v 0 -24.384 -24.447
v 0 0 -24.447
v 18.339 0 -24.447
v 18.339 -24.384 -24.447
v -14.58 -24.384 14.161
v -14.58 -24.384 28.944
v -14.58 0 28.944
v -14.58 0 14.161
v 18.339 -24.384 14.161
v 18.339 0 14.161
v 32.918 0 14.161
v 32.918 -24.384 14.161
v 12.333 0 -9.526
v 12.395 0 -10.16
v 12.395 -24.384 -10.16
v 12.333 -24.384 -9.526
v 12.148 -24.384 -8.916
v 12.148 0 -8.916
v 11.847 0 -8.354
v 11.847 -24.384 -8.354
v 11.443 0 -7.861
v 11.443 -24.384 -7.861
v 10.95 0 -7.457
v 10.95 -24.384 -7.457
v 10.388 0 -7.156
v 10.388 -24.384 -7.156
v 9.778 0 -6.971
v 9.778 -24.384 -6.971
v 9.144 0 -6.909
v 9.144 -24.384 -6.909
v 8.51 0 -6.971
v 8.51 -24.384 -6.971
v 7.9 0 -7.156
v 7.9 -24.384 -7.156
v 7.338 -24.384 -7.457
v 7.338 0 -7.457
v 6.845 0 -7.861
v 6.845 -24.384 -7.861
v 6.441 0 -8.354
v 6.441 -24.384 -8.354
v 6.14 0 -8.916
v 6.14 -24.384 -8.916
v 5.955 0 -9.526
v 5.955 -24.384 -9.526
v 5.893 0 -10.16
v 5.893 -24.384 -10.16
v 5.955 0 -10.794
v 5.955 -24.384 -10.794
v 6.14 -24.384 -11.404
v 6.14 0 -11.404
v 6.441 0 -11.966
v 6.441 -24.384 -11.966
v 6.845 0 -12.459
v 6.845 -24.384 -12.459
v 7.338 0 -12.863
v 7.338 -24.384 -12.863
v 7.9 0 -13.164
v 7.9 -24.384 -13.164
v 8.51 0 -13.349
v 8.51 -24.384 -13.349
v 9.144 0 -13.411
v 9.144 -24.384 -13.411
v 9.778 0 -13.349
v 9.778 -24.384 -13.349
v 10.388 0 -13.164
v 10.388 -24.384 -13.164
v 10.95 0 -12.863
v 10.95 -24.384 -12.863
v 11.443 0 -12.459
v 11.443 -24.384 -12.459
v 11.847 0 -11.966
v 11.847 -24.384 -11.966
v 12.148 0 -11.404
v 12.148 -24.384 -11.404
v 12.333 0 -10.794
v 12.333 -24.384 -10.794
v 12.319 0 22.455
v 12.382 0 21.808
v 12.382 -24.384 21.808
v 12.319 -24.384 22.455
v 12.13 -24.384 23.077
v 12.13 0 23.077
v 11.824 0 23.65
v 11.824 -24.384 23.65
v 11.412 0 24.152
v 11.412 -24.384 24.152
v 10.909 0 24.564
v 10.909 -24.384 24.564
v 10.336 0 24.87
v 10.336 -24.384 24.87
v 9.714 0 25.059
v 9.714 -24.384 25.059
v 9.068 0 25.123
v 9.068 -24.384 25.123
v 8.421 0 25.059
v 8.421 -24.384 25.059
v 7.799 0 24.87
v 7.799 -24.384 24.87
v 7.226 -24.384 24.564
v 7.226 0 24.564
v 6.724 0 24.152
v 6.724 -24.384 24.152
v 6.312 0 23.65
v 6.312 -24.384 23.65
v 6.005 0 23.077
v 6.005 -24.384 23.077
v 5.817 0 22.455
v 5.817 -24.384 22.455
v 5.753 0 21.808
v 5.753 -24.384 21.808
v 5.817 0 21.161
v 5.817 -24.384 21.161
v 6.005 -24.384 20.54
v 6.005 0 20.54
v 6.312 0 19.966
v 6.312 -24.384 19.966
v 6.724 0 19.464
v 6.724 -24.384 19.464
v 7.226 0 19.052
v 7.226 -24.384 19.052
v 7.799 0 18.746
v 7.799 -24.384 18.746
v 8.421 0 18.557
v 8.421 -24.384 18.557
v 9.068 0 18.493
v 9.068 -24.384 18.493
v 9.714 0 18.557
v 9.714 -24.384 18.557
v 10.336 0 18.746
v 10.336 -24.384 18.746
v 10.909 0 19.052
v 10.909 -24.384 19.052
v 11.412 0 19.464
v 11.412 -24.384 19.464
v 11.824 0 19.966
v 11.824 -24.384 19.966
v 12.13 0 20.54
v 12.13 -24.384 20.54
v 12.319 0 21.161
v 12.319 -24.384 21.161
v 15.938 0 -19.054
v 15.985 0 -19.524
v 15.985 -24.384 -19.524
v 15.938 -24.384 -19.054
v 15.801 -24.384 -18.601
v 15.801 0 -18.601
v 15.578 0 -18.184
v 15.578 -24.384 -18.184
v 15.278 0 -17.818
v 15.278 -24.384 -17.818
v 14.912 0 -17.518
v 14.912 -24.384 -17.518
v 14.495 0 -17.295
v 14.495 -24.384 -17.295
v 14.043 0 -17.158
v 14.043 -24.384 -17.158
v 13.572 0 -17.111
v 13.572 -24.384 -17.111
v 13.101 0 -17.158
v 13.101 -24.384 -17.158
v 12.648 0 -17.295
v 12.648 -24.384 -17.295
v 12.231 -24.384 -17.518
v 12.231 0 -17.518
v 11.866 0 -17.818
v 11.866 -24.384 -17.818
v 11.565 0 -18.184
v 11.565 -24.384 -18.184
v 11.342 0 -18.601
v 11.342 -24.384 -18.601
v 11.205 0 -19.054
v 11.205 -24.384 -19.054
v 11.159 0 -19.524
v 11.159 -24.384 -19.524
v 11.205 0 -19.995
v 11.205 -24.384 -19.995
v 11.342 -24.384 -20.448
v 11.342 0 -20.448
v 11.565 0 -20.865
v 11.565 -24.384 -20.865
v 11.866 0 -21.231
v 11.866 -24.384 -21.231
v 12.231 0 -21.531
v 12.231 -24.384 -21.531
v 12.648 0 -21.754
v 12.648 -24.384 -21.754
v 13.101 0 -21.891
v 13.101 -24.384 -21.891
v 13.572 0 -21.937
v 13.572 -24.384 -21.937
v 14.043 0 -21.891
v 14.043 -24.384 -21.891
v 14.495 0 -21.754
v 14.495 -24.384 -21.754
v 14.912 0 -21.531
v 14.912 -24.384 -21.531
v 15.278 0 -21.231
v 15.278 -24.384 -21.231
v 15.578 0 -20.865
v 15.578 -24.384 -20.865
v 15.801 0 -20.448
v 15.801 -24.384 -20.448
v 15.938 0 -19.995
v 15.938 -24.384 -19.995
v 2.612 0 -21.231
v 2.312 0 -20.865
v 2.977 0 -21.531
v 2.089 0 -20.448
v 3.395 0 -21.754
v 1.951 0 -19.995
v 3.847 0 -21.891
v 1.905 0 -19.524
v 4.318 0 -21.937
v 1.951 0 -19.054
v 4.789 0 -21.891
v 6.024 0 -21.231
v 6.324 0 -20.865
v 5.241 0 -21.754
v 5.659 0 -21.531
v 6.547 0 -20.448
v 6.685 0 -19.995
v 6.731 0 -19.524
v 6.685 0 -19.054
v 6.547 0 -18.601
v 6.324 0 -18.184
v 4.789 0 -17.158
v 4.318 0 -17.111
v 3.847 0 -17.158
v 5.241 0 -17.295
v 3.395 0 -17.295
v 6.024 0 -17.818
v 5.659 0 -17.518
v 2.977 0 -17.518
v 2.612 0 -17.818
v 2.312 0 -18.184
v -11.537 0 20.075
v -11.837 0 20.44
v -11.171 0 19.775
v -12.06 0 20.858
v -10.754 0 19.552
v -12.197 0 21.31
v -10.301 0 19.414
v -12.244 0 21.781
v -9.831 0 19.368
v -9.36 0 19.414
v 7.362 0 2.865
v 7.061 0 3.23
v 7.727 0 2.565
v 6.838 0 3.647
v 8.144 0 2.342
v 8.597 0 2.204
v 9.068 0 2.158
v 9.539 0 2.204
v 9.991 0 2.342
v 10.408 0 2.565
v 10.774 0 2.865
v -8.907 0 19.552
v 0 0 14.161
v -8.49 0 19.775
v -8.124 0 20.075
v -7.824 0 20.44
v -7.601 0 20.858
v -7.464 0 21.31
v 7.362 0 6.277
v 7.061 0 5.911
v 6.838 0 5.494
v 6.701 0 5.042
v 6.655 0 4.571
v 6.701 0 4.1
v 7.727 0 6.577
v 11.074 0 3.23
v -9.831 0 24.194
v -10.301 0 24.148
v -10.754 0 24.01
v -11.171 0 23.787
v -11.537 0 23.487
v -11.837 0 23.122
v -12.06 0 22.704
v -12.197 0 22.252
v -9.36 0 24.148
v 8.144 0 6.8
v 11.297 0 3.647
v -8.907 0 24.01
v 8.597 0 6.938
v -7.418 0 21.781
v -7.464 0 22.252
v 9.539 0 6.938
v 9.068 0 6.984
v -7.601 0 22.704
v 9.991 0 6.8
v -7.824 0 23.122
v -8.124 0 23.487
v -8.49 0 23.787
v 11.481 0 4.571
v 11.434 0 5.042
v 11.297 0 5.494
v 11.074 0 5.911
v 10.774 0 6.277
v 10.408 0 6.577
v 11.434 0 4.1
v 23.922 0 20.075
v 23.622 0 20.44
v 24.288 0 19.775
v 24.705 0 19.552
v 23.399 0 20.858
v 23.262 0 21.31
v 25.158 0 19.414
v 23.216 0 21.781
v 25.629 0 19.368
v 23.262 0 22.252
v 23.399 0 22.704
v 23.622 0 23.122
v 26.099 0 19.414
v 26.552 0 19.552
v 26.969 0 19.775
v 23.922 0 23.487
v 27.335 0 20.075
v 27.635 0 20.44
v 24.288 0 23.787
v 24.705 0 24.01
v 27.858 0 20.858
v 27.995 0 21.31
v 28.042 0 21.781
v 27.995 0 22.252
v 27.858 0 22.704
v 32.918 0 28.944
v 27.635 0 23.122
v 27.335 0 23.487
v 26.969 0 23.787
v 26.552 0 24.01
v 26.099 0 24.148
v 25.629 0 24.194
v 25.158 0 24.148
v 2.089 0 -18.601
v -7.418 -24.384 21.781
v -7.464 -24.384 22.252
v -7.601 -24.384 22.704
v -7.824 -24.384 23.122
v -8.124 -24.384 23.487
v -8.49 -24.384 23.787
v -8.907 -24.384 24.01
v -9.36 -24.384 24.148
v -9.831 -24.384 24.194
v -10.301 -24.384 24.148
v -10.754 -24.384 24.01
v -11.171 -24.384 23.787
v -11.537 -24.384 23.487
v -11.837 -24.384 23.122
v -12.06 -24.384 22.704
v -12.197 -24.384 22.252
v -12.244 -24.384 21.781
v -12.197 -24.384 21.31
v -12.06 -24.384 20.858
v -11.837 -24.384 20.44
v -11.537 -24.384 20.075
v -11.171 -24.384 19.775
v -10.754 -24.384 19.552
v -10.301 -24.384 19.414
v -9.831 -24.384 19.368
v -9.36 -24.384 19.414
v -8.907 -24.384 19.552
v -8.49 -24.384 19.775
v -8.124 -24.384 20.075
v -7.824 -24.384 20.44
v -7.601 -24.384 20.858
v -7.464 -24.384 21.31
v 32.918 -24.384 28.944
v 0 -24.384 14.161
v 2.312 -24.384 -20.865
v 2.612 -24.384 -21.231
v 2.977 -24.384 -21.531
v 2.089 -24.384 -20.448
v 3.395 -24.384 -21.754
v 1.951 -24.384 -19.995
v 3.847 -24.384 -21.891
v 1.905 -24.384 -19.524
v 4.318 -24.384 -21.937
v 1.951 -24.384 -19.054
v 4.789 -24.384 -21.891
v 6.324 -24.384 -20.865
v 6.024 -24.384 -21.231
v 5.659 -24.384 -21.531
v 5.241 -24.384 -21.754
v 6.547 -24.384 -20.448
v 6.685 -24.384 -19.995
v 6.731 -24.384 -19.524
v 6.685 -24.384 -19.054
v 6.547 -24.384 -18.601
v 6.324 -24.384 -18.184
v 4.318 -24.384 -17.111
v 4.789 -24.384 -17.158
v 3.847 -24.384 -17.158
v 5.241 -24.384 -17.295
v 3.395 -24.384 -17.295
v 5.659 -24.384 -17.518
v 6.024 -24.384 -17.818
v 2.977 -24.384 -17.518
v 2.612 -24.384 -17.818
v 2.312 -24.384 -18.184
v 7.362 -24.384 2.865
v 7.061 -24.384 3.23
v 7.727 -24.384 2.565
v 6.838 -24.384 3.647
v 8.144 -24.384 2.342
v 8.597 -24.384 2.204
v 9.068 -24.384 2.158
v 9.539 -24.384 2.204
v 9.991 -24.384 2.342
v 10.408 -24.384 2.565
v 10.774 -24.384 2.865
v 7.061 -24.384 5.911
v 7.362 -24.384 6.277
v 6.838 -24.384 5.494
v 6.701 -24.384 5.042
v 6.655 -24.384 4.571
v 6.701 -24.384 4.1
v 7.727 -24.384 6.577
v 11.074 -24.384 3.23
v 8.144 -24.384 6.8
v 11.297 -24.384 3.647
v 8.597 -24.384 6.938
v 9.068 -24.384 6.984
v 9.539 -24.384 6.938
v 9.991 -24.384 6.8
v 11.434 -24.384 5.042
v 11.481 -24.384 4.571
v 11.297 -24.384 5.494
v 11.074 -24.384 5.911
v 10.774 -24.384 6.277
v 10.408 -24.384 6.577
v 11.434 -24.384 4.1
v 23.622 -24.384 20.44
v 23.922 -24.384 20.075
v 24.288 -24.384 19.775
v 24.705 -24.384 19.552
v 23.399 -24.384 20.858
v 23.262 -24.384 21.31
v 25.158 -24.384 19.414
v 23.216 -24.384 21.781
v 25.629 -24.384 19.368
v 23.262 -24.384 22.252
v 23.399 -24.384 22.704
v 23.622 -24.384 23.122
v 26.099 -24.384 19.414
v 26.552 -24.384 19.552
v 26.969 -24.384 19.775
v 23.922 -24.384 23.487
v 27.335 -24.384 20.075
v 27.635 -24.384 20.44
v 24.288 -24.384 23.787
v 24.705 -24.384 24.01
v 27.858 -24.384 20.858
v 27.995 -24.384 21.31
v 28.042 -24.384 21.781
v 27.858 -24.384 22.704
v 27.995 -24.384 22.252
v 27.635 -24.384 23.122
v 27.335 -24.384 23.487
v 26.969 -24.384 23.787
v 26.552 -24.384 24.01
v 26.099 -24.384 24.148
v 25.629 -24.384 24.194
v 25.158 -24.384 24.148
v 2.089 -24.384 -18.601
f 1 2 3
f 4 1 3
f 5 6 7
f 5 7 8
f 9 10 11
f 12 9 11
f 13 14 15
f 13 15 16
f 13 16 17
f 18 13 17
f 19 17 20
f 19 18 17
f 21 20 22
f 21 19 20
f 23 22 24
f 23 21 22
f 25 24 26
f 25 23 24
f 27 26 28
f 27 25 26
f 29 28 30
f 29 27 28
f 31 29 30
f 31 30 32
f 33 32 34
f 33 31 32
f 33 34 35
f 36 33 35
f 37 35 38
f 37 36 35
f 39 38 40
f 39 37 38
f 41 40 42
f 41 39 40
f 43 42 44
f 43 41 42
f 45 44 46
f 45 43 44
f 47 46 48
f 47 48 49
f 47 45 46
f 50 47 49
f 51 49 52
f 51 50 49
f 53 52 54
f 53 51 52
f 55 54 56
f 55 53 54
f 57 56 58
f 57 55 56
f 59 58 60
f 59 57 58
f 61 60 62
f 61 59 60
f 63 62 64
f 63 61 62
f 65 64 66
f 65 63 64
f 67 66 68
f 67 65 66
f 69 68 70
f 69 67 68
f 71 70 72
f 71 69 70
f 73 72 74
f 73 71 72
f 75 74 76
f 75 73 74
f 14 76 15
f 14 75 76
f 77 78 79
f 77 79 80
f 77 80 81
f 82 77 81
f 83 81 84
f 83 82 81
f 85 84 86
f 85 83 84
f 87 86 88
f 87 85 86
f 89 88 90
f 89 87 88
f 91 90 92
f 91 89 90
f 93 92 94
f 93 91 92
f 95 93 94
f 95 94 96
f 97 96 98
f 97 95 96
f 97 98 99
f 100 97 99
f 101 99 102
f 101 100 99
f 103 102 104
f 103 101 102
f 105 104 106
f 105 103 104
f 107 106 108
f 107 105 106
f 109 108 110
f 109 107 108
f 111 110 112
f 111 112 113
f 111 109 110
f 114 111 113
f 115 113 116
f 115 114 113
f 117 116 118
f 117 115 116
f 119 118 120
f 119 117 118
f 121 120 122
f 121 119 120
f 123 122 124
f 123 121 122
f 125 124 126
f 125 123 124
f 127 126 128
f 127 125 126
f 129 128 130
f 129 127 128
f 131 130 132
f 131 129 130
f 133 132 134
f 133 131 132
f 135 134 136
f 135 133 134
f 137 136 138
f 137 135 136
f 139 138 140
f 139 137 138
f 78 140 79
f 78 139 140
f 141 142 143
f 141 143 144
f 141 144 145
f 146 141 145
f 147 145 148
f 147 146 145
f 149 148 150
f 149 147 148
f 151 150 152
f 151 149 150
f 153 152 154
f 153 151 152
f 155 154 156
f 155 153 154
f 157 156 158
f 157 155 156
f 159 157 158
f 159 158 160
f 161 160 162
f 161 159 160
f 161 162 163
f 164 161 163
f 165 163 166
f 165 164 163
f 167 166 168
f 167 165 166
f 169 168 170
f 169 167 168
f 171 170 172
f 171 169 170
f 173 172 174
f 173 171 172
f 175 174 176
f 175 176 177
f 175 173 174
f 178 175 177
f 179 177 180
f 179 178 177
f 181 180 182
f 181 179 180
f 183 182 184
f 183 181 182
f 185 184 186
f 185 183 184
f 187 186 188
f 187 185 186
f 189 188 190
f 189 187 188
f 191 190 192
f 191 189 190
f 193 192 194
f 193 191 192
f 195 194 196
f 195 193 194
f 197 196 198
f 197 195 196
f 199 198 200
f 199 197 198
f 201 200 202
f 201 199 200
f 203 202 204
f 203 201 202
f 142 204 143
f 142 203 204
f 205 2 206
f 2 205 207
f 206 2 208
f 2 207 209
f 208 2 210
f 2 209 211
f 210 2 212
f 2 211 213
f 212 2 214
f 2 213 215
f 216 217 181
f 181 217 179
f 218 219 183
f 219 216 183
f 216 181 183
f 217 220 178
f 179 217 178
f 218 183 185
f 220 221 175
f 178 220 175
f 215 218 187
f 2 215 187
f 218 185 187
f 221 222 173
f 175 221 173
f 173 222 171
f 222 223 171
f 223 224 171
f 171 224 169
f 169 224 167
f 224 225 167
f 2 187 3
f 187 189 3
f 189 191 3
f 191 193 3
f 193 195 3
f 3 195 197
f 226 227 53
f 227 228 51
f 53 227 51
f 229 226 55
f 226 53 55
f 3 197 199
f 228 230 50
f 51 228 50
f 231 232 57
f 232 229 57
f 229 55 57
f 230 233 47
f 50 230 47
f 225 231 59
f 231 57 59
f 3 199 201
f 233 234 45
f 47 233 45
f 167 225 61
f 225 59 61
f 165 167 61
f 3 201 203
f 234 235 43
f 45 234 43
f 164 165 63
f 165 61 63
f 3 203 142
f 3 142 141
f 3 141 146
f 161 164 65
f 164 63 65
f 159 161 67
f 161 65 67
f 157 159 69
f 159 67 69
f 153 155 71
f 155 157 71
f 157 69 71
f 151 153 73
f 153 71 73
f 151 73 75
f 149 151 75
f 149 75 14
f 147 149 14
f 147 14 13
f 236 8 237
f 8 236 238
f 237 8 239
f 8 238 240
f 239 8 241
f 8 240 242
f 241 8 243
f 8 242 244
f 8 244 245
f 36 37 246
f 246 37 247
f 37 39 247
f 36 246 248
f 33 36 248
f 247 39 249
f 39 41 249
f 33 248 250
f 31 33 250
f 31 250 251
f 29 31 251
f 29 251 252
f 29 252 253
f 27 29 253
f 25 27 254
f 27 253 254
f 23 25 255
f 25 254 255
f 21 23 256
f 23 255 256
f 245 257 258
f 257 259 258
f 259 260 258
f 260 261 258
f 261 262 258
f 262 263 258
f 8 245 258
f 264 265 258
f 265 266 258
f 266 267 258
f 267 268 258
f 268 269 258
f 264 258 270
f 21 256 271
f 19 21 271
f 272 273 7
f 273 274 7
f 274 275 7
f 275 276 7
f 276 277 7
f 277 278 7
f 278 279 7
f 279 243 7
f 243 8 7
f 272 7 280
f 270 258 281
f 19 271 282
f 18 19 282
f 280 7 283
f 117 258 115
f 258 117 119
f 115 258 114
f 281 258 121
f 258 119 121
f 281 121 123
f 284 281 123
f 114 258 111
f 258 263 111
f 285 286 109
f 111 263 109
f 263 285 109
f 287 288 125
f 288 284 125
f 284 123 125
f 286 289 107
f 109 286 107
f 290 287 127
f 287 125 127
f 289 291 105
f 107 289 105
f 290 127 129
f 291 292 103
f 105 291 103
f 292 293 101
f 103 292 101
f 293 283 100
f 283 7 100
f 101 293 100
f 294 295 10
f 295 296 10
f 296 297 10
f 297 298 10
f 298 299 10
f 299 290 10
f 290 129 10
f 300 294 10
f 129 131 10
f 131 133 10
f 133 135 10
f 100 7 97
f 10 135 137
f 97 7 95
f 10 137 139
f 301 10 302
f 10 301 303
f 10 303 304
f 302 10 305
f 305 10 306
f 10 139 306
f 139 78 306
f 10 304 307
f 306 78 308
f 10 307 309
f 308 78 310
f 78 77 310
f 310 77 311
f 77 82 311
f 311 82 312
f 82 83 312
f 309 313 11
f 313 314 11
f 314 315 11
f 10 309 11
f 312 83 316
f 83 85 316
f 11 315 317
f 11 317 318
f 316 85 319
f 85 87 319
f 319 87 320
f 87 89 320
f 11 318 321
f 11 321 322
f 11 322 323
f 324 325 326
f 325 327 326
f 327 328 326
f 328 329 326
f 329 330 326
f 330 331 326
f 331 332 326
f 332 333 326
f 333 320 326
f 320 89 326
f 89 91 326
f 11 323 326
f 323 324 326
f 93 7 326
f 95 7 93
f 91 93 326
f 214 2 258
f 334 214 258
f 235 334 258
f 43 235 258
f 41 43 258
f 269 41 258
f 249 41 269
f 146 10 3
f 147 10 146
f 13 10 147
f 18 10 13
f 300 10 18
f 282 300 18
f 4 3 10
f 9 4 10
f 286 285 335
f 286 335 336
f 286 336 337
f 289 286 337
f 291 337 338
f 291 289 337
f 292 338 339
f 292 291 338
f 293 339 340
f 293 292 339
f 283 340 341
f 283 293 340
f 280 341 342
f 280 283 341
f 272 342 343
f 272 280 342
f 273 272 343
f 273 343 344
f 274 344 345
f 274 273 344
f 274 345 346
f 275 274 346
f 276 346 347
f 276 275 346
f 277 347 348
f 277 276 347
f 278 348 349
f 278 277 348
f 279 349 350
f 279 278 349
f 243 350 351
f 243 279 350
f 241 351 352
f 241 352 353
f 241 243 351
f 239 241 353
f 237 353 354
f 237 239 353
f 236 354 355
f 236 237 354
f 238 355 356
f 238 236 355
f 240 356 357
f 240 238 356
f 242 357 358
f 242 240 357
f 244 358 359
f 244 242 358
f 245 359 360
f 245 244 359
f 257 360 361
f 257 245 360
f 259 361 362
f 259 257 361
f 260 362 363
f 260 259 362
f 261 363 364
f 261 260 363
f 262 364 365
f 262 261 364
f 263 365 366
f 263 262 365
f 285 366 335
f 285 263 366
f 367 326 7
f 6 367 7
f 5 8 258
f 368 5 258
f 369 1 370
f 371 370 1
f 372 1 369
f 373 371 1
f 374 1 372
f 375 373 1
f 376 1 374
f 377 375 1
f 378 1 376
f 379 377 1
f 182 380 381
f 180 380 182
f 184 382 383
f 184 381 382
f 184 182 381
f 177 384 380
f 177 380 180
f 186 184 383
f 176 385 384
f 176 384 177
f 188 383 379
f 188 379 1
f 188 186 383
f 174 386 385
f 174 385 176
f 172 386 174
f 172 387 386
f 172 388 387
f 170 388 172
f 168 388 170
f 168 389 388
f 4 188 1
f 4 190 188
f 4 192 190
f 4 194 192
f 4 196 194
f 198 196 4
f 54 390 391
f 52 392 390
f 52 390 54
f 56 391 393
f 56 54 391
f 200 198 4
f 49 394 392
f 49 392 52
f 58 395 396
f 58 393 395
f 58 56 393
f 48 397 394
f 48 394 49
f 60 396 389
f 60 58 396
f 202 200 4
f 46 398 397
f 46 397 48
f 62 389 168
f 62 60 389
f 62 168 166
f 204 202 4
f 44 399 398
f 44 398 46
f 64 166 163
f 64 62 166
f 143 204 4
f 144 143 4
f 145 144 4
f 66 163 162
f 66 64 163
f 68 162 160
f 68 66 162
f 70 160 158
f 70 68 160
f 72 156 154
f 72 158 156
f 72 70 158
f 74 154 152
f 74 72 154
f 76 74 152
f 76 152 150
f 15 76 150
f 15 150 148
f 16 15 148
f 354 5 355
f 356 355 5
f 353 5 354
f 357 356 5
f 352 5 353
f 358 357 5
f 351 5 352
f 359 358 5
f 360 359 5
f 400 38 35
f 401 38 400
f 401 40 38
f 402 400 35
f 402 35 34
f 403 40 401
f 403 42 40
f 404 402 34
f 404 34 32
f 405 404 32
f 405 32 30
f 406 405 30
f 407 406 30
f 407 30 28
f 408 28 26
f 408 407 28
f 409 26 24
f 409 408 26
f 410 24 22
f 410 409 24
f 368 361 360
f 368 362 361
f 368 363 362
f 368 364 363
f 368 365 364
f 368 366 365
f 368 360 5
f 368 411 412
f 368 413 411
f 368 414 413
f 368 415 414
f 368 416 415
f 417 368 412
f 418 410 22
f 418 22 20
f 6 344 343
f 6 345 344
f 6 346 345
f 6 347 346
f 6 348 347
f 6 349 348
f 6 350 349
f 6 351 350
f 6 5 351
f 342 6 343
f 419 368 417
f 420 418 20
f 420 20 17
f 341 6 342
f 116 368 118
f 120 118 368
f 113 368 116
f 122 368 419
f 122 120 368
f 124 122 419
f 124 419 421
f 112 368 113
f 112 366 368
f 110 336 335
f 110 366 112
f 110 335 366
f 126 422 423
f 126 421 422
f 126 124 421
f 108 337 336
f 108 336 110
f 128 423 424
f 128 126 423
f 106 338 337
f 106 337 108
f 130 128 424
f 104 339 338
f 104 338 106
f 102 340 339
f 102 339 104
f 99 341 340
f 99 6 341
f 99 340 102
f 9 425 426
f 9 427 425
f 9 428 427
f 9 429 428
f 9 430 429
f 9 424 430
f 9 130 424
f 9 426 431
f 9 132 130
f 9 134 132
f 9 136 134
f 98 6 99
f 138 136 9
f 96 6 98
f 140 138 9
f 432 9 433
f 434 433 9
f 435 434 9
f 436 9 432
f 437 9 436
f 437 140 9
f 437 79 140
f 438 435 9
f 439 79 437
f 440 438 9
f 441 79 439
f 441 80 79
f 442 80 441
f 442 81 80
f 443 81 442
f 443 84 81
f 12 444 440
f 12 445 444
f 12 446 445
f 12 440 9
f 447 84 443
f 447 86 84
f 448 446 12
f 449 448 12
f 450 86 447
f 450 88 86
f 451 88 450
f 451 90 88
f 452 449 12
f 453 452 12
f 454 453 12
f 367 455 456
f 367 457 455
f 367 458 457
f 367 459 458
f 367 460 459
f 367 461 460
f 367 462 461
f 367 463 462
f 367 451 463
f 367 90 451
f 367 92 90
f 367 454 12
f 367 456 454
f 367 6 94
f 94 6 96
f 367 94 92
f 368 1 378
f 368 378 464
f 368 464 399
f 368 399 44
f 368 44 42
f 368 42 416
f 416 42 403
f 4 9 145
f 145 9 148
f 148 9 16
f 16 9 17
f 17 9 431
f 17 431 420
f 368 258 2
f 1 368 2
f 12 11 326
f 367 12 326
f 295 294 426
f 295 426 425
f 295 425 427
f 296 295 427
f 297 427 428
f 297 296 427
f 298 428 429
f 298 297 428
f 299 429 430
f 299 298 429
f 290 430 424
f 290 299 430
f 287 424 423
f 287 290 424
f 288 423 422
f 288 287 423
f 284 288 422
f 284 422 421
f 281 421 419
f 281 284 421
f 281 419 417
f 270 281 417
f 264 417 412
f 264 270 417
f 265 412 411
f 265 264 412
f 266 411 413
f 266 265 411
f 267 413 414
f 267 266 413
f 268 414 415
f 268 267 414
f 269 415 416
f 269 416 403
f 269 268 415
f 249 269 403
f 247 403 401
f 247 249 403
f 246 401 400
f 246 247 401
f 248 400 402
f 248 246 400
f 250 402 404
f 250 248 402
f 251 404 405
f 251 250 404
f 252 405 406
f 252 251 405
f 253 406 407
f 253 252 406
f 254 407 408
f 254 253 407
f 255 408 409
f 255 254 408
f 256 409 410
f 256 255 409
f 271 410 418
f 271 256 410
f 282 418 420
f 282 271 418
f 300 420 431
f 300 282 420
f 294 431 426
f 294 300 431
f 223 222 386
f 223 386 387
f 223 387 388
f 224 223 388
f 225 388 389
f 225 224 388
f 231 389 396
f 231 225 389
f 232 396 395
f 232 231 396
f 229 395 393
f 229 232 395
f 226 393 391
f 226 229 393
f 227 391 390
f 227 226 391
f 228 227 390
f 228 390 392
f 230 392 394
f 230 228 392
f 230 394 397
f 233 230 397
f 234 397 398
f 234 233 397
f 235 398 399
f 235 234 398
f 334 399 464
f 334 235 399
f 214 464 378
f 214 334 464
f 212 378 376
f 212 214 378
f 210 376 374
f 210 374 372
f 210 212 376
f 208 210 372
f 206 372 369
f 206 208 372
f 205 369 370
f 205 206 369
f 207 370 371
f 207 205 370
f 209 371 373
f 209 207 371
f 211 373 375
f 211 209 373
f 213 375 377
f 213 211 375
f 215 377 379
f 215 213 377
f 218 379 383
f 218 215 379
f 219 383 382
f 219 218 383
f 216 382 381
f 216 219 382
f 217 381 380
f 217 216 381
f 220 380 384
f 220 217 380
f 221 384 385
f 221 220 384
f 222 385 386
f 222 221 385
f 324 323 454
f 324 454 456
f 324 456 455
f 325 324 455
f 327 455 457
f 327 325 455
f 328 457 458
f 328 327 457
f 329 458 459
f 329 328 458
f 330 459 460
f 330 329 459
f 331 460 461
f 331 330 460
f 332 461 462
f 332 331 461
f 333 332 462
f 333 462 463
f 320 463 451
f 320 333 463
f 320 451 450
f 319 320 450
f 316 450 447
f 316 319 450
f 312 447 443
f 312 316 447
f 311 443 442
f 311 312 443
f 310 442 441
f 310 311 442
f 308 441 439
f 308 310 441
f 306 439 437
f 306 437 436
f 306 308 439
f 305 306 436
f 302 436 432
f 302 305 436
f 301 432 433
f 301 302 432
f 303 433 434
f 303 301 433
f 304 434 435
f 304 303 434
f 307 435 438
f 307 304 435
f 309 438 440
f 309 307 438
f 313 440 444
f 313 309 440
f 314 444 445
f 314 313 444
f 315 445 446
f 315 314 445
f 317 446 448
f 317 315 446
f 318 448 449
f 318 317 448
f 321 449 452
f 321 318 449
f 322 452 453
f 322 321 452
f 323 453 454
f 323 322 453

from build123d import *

# Parameters (mm, degrees)
F0_R     = 2.413
F0_R_2   = 3.2512
F0_R_3   = 3.3147
F1_DEPTH = 24.384


with BuildPart() as f1:
    # F0 (on Front) → F1 (new body)
    with BuildSketch(Plane.XZ):
        Polygon((32.9184, 28.943862), (-14.5796, 28.943862), (-14.5796, 14.161062), (0, 14.161062), (0, -24.446938), (18.3388, -24.446938), (18.3388, 14.161062), (32.9184, 14.161062), align=None)
        with Locations((4.317999, -19.524282)):
            Circle(F0_R, mode=Mode.SUBTRACT)
        with Locations((9.143999, -10.159998)):
            Circle(F0_R_2, mode=Mode.SUBTRACT)
        with Locations((13.571819, -19.524282)):
            Circle(F0_R, mode=Mode.SUBTRACT)
        with Locations((9.0678, 4.570901)):
            Circle(F0_R, mode=Mode.SUBTRACT)
        with Locations((-9.830709, 21.781059)):
            Circle(F0_R, mode=Mode.SUBTRACT)
        with Locations((9.0678, 21.808036)):
            Circle(F0_R_3, mode=Mode.SUBTRACT)
        with Locations((25.6286, 21.781059)):
            Circle(F0_R, mode=Mode.SUBTRACT)
    extrude(amount=F1_DEPTH)


solid = f1.part
